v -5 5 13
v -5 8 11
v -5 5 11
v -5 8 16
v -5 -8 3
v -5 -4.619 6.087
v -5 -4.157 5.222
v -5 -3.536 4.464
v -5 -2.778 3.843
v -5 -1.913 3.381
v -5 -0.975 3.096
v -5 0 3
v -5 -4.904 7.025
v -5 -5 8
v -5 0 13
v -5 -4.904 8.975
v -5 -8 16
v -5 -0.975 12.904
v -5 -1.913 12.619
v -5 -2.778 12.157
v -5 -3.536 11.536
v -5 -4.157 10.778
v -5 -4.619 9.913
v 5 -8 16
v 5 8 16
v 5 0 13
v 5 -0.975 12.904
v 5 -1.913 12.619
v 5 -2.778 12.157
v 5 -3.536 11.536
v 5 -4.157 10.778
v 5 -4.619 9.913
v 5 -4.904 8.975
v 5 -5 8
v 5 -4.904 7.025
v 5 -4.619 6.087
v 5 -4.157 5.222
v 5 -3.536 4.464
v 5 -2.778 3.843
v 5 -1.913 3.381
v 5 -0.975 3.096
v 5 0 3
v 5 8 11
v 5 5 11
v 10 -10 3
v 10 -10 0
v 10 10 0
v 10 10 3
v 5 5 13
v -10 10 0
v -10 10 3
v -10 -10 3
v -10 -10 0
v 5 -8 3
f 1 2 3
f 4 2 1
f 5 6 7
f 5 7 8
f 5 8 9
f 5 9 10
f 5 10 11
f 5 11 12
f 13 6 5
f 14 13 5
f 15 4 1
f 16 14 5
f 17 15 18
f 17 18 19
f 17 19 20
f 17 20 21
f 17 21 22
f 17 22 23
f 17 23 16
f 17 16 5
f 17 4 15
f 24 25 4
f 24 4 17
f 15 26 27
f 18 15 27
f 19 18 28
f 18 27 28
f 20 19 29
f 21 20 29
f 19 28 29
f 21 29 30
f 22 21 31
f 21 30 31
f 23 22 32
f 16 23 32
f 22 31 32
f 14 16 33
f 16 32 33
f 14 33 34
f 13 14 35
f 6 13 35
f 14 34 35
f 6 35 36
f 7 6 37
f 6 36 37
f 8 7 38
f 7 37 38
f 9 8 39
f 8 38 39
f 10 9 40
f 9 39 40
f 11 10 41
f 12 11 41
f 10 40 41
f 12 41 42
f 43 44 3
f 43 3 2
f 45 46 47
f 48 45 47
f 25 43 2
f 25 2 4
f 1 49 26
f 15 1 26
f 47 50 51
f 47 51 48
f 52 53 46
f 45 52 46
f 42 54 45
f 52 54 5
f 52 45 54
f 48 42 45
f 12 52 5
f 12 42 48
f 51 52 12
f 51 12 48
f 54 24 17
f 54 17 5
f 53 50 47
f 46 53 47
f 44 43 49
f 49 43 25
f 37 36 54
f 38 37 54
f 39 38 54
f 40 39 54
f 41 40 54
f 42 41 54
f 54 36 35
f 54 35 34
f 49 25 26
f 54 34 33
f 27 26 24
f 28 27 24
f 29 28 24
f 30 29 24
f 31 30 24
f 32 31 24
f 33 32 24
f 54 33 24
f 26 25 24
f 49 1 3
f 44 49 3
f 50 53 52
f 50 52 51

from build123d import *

# Parameters (mm, degrees)
SKETCH_W          = 20
SKETCH_H          = 20
PAD_DEPTH         = 3
PAD001_DEPTH      = 5
PAD001_DEPTH_BACK = 5


with BuildPart() as part:
    # Sketch → Pad (new body)
    with BuildSketch(Plane.XY):
        Rectangle(SKETCH_W, SKETCH_H)
    extrude(amount=PAD_DEPTH)

    # Sketch001 → Pad001 (join, two sides)
    with BuildSketch(Plane.YZ) as pad001_sk:
        with BuildLine():
            ThreePointArc((0, 13), (-5, 8), (0, 3))
            Line((0, 3), (8.878697, 3))
            Line((8.878697, 0), (8.878697, 3))
            Line((-8, 0), (8.878697, 0))
            Line((-8, 16), (-8, 0))
            Line((8, 16), (-8, 16))
            Line((8, 11), (8, 16))
            Line((5, 11), (8, 11))
            Line((5, 13), (5, 11))
            Line((5, 13), (0, 13))
        make_face()
    extrude(amount=PAD001_DEPTH)
    extrude(pad001_sk.sketch, amount=-PAD001_DEPTH_BACK)


solid = part.part
